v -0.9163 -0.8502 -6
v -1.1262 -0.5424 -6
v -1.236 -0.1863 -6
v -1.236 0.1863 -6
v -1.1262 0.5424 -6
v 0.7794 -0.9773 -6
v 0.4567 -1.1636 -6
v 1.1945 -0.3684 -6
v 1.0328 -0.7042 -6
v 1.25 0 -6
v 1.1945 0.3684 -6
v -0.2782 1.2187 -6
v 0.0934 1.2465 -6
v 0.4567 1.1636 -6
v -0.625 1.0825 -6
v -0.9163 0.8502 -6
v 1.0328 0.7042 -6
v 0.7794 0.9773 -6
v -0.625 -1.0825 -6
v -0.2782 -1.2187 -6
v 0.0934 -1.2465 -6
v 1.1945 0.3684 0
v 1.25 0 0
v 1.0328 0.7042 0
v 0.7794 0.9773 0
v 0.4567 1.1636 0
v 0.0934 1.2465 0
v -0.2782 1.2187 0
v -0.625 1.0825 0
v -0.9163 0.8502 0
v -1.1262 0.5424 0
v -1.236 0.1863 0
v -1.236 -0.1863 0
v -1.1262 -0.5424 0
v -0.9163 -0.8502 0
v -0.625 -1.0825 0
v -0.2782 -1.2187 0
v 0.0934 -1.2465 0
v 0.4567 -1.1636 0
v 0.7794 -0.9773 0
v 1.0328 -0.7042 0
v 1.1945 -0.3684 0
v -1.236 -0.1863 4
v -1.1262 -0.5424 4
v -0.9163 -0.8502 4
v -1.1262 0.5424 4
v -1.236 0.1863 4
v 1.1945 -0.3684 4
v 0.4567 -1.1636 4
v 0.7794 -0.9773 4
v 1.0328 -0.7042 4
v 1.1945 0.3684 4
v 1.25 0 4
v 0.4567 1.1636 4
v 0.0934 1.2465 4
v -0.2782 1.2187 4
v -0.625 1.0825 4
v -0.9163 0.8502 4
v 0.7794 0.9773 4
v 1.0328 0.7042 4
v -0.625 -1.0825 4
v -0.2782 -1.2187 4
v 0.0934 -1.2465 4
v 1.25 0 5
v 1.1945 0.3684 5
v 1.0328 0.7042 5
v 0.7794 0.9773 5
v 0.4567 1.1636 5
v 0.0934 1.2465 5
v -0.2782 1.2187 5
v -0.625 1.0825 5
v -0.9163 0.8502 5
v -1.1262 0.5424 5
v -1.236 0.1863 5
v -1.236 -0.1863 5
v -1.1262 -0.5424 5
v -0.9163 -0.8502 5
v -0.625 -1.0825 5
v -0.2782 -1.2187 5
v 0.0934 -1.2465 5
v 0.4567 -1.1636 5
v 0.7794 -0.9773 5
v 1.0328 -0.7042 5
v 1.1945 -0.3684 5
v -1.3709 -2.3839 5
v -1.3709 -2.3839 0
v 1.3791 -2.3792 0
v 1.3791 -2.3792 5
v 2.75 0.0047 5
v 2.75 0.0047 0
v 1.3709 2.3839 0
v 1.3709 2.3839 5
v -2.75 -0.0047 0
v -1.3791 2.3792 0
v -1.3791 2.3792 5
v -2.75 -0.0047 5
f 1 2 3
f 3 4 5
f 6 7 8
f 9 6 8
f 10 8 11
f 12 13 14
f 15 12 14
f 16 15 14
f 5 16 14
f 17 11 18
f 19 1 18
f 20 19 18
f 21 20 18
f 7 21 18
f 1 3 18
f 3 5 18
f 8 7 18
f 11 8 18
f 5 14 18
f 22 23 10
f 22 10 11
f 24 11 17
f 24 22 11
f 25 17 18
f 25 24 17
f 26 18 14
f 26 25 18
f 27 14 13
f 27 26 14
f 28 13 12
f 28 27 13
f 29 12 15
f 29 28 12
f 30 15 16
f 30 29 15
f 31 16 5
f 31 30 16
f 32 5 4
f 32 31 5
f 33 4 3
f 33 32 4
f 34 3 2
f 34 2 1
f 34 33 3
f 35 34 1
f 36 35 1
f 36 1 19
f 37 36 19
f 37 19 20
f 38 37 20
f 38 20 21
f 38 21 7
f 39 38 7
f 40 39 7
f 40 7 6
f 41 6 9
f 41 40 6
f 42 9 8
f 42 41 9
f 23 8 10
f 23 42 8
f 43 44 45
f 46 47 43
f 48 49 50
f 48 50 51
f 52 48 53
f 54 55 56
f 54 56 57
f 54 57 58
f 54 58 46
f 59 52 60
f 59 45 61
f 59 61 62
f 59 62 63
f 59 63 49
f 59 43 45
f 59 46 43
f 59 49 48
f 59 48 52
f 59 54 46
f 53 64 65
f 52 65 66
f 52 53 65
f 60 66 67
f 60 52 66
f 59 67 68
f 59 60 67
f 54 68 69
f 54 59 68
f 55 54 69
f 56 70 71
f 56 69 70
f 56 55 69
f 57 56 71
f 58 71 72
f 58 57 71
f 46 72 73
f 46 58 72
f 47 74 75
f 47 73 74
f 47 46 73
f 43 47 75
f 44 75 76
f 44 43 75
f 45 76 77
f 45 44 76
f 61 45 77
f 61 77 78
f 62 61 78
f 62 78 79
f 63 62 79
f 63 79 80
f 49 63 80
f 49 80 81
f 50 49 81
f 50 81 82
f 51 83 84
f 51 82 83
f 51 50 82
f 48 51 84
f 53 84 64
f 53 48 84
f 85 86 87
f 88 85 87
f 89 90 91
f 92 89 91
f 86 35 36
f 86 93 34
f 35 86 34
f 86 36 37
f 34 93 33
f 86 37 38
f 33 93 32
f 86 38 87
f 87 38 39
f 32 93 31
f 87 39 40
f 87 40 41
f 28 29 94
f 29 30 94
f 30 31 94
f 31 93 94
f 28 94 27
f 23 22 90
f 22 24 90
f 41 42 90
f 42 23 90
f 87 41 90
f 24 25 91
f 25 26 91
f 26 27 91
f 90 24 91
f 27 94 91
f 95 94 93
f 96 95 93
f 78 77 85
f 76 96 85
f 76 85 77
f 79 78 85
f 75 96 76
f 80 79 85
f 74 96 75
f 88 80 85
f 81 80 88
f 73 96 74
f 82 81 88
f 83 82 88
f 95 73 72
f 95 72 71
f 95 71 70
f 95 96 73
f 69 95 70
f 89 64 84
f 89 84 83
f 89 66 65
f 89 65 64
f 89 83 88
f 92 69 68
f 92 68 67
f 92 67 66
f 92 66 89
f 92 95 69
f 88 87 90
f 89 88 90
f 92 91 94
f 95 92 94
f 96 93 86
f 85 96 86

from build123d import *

# Parameters (mm, degrees)
F1_DEPTH = 5
F2_R     = 1.25
F3_DEPTH = 6
F5_R     = 1.25
F6_DEPTH = 7


with BuildPart() as f1:
    # F0 (on Top) → F1 (new body)
    with BuildSketch(Plane.XY):
        Polygon((1.379062, -2.379225), (2.75, 0.00469), (1.370938, 2.383915), (-1.379062, 2.379225), (-2.75, -0.00469), (-1.370938, -2.383915), align=None)
    extrude(amount=F1_DEPTH)

    # F2 (on Top) → F3 (join)
    with BuildSketch(Plane.XY):
        Circle(F2_R)
    extrude(amount=-F3_DEPTH)

    # F5 (on offset) → F6 (cut)
    with BuildSketch(Plane.XY.offset(4)):
        Circle(F5_R)
    extrude(amount=F6_DEPTH, mode=Mode.SUBTRACT)


solid = f1.part
